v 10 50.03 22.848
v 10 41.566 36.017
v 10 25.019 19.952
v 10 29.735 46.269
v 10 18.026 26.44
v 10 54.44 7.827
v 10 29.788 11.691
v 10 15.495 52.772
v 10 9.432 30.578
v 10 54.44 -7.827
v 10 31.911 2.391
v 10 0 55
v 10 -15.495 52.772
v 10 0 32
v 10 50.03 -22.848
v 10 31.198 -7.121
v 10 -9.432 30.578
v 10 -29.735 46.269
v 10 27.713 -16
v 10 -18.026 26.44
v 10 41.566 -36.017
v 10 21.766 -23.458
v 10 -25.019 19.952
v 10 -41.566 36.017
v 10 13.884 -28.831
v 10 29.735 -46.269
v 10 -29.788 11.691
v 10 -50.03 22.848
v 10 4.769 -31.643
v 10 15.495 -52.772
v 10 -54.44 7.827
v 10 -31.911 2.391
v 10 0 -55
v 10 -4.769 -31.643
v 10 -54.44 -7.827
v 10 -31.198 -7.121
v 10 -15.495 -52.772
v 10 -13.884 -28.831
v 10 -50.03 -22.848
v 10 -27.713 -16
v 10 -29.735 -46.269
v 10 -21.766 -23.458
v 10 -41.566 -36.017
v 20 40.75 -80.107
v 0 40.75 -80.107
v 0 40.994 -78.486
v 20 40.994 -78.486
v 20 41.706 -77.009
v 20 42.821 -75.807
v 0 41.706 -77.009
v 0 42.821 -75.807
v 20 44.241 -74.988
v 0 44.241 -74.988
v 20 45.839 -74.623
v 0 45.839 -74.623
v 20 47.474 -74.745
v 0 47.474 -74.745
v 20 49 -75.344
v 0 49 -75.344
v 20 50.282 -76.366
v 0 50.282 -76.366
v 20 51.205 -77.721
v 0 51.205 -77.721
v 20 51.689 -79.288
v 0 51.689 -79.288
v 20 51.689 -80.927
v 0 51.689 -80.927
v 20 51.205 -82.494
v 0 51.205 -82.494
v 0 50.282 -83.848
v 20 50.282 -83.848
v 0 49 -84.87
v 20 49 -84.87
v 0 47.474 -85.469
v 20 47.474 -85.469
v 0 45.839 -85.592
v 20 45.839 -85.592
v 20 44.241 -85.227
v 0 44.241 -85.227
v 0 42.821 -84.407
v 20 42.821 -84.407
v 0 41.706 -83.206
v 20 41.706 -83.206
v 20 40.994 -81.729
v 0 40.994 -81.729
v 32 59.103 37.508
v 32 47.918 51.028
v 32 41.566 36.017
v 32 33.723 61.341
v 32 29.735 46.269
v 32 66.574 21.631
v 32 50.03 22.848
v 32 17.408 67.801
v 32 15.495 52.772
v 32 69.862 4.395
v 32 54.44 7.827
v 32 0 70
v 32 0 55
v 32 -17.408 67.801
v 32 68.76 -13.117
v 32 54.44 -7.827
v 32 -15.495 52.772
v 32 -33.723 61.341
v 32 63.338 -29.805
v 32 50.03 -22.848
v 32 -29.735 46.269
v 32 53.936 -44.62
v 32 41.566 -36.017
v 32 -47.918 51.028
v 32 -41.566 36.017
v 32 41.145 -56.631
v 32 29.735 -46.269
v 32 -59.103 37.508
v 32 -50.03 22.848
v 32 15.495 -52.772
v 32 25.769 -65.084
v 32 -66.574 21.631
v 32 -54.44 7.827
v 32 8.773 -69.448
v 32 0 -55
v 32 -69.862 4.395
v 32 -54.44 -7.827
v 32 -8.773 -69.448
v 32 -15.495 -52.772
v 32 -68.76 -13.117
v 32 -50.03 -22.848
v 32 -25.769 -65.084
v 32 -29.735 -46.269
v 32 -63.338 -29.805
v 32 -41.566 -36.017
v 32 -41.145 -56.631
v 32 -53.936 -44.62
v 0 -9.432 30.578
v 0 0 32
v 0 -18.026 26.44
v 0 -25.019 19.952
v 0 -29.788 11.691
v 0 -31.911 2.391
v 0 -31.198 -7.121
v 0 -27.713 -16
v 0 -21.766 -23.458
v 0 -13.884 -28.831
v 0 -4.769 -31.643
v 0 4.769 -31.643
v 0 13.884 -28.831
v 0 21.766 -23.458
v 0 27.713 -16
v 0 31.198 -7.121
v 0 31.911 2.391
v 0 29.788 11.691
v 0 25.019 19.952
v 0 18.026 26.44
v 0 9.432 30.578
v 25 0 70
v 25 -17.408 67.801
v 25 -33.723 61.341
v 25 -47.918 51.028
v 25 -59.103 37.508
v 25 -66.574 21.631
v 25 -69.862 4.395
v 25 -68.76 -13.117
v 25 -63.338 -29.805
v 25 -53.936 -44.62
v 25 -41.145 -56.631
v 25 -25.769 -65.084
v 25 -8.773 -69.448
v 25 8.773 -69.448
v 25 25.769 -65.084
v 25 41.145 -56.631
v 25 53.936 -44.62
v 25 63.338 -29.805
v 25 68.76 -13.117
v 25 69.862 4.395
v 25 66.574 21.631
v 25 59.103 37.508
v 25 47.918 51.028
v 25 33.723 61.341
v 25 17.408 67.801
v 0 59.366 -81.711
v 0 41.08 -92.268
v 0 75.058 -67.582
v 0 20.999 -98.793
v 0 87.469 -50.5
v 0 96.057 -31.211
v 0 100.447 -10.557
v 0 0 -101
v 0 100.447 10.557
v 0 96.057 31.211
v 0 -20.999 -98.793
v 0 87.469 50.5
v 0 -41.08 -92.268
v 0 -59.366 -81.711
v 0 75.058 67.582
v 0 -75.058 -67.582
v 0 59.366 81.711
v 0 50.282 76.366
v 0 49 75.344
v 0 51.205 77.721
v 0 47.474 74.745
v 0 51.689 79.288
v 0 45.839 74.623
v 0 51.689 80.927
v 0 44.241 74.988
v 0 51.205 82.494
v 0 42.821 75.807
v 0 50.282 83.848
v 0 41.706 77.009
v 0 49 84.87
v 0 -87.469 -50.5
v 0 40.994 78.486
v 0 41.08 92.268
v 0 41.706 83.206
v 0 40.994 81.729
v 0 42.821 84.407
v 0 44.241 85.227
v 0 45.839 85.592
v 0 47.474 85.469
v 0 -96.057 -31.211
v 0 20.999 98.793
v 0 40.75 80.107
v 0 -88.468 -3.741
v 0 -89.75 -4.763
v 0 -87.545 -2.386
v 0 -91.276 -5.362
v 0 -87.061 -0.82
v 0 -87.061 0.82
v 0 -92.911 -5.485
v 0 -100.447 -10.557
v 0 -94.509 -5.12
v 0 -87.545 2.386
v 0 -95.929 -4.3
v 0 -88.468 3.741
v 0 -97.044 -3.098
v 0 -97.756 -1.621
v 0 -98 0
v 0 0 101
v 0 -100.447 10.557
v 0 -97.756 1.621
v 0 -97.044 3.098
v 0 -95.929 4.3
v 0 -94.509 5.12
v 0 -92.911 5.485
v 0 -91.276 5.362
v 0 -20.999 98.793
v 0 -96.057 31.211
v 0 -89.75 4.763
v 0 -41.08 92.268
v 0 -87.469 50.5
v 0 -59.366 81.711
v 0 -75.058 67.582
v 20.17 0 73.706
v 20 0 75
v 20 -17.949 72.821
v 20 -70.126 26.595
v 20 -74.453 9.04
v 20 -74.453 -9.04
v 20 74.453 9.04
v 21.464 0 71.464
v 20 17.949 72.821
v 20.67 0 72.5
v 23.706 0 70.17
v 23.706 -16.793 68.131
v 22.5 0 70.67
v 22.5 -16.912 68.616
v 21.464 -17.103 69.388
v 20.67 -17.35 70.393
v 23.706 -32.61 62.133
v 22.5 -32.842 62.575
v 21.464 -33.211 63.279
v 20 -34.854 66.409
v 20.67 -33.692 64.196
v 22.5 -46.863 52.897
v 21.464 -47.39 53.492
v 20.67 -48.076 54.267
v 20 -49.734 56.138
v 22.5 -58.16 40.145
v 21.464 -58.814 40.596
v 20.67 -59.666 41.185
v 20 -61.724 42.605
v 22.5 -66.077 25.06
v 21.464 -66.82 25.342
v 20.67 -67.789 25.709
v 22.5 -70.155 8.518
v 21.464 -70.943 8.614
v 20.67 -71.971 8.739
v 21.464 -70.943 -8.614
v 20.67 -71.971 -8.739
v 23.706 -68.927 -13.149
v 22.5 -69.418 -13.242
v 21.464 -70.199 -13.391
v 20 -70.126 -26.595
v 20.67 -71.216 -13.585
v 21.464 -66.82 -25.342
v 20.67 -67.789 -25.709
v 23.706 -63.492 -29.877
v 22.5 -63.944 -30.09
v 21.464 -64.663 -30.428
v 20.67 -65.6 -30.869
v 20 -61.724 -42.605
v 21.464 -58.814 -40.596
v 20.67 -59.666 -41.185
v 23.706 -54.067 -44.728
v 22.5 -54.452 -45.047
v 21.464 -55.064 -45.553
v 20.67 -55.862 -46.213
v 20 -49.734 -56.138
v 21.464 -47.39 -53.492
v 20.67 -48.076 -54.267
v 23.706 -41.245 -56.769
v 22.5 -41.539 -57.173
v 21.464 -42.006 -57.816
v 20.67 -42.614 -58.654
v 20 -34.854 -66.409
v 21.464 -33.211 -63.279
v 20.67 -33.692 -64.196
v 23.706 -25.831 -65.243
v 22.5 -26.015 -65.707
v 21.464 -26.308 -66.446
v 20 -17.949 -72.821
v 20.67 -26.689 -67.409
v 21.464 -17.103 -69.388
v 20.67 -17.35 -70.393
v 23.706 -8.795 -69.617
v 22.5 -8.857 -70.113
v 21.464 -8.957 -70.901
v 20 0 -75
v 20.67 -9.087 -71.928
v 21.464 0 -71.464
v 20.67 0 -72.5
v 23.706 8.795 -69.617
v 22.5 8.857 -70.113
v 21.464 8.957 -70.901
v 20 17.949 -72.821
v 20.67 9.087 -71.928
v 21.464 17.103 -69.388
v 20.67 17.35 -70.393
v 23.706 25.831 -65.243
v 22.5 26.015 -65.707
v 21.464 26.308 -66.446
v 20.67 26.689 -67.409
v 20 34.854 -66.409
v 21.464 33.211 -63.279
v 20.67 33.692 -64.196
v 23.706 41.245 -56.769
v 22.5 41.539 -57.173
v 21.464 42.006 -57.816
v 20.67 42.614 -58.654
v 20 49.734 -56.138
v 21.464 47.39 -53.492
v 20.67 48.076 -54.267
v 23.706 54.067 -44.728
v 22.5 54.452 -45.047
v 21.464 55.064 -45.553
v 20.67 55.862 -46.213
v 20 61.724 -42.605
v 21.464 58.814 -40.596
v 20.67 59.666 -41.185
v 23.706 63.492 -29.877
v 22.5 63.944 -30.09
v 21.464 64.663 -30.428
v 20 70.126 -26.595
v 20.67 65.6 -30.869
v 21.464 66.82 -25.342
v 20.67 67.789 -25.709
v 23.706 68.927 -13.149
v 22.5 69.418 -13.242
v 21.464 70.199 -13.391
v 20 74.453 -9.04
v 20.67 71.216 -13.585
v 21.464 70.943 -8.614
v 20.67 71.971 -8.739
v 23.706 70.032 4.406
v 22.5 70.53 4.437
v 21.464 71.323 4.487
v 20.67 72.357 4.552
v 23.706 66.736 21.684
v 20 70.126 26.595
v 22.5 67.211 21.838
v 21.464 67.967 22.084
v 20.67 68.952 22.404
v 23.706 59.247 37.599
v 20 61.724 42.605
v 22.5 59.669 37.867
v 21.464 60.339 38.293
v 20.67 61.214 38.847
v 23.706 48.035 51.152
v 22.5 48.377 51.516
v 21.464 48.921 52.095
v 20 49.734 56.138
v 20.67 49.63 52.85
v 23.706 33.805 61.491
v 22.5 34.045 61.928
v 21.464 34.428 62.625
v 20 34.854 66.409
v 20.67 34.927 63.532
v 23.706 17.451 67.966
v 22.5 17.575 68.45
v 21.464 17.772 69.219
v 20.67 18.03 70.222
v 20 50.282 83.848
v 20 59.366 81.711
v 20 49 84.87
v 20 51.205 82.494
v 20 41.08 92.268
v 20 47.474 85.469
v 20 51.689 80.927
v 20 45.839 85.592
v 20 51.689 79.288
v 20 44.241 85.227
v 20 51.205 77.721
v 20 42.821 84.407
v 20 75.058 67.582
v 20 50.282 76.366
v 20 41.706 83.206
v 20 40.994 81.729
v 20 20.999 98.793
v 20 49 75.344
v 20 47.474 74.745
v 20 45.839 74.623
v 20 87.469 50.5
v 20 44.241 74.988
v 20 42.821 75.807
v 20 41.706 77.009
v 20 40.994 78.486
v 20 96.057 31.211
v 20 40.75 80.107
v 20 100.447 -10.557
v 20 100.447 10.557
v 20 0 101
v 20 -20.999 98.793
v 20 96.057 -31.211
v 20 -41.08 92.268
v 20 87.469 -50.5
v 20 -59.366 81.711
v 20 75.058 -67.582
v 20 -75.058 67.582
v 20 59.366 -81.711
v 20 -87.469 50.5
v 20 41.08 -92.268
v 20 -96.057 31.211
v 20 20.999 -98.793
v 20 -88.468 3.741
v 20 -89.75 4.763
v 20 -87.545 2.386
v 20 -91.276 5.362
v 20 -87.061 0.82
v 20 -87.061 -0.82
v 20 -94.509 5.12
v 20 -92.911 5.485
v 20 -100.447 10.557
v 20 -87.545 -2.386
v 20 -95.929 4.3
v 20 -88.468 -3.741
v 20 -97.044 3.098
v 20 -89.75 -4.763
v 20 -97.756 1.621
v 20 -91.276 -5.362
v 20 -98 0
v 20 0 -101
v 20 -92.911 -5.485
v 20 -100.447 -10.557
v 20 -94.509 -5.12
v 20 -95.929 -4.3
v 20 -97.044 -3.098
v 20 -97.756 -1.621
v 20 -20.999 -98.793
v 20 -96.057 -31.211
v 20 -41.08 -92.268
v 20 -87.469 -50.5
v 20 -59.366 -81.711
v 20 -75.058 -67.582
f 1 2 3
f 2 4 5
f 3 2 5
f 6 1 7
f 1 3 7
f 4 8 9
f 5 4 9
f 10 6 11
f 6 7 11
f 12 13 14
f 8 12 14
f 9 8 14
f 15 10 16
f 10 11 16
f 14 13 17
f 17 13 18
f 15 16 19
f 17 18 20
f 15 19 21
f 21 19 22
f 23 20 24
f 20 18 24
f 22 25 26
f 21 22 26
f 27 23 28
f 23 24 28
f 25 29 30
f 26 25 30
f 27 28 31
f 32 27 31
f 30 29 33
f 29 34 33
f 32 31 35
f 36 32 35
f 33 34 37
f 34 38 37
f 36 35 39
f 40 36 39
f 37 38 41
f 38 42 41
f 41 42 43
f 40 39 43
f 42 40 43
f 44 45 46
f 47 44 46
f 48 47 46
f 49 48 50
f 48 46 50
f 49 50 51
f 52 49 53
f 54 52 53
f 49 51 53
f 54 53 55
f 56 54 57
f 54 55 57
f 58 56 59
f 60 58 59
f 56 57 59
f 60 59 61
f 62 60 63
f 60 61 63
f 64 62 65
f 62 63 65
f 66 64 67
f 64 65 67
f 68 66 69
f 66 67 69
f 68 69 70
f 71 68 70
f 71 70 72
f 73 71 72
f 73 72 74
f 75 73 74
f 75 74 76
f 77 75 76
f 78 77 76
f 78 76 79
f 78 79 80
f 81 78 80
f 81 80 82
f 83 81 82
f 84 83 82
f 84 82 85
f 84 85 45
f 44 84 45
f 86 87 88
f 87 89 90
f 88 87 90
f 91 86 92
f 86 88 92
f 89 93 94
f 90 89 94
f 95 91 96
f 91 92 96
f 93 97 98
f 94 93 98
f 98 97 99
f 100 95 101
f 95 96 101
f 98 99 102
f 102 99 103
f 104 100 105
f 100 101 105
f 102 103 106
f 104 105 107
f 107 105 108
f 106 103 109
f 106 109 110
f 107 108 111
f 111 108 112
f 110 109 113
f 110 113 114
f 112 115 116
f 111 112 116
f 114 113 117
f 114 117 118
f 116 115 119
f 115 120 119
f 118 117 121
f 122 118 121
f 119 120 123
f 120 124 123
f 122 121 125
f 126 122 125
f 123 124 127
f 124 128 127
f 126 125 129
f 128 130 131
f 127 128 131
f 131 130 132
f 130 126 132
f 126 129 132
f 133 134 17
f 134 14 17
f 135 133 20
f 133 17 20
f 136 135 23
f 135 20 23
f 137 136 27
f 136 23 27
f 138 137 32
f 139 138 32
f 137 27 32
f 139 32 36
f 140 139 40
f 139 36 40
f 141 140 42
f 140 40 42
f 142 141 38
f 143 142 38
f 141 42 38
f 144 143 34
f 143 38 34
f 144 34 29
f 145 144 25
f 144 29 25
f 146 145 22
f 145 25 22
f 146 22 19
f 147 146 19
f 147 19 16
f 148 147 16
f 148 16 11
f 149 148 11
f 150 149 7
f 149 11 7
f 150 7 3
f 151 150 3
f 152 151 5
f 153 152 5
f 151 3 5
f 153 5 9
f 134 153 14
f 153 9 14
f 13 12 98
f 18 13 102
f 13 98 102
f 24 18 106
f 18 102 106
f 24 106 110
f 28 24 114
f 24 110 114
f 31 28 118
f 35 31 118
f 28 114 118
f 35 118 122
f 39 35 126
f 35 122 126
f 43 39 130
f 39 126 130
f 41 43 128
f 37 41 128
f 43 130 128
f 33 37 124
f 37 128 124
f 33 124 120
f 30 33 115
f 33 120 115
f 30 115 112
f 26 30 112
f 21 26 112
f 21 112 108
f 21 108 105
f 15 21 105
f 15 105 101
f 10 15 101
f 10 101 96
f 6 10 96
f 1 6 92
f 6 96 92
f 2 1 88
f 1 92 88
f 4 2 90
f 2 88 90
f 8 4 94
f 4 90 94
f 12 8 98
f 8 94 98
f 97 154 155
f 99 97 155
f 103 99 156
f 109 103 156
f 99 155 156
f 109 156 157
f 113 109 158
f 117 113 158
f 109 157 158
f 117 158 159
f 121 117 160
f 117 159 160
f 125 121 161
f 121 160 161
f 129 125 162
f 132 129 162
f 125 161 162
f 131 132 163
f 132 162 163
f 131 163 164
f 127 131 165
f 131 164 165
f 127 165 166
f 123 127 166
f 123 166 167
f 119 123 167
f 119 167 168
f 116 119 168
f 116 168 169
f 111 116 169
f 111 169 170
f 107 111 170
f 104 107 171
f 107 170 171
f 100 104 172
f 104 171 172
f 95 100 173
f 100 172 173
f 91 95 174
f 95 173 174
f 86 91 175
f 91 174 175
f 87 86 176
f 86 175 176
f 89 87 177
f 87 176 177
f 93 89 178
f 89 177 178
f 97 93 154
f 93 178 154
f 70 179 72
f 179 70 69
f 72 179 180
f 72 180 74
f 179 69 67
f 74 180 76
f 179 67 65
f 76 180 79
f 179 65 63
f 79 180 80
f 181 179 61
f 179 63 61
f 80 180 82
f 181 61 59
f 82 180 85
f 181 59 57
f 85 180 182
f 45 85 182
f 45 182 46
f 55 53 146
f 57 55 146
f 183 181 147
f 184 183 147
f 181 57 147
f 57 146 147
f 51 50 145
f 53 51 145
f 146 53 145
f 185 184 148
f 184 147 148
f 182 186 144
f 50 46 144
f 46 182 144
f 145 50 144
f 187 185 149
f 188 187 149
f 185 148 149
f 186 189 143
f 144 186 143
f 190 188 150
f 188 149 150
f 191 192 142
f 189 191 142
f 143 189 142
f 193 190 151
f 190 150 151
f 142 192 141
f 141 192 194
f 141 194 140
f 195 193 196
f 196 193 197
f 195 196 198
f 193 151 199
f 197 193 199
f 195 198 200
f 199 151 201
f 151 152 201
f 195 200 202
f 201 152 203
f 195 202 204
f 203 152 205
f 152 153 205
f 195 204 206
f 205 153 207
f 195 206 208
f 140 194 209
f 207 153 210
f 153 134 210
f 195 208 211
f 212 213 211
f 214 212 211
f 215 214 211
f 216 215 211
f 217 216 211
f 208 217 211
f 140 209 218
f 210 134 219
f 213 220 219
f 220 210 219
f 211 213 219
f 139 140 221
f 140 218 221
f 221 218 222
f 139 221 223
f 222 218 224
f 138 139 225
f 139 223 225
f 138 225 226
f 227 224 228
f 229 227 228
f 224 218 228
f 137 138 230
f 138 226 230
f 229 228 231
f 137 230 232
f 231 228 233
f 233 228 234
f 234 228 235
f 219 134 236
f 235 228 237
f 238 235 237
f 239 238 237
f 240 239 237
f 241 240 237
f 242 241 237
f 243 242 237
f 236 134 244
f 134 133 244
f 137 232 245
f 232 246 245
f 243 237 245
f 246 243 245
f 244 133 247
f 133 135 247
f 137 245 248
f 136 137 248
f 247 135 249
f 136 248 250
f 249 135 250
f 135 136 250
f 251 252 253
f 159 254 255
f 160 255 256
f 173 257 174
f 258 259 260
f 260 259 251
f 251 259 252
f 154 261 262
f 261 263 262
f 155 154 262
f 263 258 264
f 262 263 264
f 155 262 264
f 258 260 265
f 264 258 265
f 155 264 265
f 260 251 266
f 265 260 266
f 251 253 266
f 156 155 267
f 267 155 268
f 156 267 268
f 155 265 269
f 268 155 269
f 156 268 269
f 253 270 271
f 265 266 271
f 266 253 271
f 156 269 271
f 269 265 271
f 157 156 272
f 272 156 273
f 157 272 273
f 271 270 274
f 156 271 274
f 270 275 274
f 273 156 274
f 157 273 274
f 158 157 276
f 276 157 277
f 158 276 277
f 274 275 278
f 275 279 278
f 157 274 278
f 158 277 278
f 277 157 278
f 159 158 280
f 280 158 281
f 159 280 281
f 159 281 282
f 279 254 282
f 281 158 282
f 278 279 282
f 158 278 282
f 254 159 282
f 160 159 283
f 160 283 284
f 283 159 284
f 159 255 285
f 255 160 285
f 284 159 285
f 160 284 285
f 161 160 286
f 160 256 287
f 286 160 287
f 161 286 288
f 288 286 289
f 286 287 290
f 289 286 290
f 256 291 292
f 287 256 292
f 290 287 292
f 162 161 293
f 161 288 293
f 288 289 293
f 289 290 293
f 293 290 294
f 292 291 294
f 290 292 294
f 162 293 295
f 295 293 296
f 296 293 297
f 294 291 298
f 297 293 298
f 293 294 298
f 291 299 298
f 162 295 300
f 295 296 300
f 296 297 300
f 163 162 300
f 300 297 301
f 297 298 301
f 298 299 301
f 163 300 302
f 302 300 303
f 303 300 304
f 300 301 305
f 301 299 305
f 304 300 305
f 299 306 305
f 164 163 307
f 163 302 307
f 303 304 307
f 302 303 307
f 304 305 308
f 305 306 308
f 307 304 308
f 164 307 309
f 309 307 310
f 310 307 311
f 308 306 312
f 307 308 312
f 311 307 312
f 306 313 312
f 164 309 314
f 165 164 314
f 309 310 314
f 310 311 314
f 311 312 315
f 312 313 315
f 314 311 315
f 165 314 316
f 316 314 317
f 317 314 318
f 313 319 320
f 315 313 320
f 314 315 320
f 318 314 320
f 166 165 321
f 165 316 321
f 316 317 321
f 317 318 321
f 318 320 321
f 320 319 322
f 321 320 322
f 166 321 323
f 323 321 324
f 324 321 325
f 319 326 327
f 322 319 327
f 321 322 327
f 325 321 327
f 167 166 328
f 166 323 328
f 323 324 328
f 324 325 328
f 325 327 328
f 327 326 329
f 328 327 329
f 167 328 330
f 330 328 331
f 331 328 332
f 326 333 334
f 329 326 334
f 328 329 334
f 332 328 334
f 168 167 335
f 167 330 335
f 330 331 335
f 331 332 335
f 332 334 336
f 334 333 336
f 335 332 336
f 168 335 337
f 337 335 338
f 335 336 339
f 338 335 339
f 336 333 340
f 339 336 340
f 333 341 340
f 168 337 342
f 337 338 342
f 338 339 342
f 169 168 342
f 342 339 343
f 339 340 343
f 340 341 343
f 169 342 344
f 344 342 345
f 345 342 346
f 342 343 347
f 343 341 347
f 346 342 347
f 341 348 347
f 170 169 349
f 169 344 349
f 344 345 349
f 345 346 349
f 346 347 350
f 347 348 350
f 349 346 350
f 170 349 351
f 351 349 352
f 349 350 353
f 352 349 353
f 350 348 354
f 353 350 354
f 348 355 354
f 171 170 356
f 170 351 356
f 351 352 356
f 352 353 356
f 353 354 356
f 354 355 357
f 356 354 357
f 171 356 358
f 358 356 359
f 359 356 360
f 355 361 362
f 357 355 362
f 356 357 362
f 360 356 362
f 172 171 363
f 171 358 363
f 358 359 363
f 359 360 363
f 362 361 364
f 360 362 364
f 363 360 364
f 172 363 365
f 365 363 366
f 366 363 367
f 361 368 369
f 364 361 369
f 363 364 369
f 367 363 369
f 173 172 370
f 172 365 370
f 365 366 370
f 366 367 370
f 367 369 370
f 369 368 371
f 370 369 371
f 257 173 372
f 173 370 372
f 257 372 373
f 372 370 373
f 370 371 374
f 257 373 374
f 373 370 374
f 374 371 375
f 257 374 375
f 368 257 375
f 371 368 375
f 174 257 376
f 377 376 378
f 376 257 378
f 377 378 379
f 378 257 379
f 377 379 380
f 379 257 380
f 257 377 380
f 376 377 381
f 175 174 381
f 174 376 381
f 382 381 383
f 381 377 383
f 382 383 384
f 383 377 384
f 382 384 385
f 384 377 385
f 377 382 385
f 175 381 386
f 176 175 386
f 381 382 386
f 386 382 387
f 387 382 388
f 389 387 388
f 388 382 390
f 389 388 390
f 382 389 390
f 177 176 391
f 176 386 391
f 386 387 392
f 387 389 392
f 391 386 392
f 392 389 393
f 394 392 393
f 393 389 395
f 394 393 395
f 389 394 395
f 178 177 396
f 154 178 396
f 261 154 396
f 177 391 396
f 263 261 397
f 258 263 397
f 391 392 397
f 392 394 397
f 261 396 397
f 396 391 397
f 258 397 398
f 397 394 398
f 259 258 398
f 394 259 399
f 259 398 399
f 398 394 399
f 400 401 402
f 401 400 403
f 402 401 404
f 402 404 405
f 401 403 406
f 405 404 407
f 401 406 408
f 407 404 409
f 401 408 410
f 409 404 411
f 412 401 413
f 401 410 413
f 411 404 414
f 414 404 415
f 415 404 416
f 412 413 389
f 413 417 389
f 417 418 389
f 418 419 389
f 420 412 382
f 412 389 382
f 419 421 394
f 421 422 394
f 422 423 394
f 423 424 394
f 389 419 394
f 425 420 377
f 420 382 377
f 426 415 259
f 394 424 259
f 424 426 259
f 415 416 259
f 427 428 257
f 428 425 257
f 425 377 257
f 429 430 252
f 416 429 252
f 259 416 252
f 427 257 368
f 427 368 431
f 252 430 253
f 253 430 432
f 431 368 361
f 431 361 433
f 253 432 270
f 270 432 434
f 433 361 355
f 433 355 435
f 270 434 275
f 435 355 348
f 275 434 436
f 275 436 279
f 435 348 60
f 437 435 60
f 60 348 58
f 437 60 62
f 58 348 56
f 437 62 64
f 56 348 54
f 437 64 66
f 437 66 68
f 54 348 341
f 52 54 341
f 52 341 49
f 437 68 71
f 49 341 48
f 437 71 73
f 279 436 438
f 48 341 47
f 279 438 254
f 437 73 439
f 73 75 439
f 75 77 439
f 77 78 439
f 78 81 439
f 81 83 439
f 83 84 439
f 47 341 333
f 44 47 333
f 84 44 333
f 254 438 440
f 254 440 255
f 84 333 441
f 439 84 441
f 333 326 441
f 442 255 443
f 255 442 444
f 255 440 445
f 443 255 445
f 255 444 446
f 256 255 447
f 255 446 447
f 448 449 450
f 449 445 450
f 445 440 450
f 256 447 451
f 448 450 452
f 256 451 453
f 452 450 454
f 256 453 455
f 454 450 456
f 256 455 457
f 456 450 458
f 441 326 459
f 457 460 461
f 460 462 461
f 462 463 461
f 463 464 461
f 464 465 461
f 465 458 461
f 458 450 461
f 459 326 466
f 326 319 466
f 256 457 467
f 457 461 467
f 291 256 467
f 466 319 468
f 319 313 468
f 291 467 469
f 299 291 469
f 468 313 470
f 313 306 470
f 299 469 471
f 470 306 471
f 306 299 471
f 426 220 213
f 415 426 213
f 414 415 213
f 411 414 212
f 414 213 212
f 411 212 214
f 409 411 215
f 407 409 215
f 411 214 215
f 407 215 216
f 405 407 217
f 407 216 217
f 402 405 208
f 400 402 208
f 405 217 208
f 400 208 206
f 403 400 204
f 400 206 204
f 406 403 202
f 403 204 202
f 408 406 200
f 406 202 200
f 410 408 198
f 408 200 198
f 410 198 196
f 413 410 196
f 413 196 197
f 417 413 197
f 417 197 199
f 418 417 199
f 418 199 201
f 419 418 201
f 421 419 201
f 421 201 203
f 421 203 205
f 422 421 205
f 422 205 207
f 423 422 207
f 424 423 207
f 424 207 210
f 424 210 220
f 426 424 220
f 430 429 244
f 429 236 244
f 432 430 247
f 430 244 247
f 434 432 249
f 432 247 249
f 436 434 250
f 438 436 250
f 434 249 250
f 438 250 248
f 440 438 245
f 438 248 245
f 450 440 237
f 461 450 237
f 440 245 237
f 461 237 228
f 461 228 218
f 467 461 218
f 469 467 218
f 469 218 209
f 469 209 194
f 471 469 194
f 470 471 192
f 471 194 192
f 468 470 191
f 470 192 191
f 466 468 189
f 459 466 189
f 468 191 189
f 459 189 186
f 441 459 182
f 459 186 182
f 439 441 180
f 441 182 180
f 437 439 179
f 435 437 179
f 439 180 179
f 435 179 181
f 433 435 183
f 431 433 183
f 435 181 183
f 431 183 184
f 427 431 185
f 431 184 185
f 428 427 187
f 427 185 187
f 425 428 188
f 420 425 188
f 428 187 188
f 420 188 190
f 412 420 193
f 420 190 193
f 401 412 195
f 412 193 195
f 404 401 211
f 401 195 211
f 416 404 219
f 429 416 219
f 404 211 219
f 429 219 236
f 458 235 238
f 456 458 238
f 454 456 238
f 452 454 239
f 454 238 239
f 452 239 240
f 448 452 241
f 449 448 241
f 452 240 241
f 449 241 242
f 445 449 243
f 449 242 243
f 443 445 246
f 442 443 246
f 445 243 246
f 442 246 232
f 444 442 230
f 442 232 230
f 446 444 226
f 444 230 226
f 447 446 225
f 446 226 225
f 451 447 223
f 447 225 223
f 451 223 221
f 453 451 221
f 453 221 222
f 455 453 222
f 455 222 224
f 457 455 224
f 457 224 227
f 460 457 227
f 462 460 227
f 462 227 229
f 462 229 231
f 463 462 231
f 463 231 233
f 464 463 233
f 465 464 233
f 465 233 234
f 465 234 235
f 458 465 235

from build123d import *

# Parameters (mm, degrees)
F2_R = 5
F4_D = 11


with BuildPart() as f1:
    # F0 (on Front) → F1 (revolve)
    with BuildSketch(Plane.XZ):
        Polygon((0, 101), (0, 32), (10, 32), (10, 55), (32, 55), (32, 70), (20, 70), (20, 101), align=None)
    revolve(axis=Axis((86.927190423, 0, 0), (1, 0, 0)))

    # F2
    f2_edges = [f1.edges().sort_by_distance(p)[0] for p in [
        (20, 0, -70),
    ]]
    fillet(f2_edges, radius=F2_R)

    # F4 (through all)
    with Locations(Plane.YZ.offset(20)):
        with Locations((46.25, 80.1073498501), (-92.5, 0), (46.25, -80.1073498501)):
            Hole(F4_D / 2)


solid = f1.part
